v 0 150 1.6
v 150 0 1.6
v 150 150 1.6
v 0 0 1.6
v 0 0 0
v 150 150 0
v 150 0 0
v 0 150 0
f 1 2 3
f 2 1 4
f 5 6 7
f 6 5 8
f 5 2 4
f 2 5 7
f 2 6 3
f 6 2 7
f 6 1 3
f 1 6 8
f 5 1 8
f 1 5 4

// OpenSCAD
// The white backing for the north camera's roof AprilTag print
// (north_roof_tag_black_id2.scad),
// a plain filled square to lay the black cells on (2026-11-05).
//
// Same size as the whole tag: 150 mm square, which is the 8 x 8 black region
// (120 mm) plus one module (15 mm) of white quiet zone on every side. Center the black piece on it so that border is even all round; the
// detector needs at least one module of white on every side to find the
// tag's outline.
//
// Printing:
//   * White filament, matte face up (same reason as the black piece: a glossy
//     face throws the IR illuminator's highlight back at the lens).
//   * White is fine in the near infrared for nearly every filament, but check
//     the finished tag under the camera at night before you mount it.

tag_size  = 150;              // whole tag including the white quiet zone
thickness = 1.6;              // mm

cube([tag_size, tag_size, thickness]);
